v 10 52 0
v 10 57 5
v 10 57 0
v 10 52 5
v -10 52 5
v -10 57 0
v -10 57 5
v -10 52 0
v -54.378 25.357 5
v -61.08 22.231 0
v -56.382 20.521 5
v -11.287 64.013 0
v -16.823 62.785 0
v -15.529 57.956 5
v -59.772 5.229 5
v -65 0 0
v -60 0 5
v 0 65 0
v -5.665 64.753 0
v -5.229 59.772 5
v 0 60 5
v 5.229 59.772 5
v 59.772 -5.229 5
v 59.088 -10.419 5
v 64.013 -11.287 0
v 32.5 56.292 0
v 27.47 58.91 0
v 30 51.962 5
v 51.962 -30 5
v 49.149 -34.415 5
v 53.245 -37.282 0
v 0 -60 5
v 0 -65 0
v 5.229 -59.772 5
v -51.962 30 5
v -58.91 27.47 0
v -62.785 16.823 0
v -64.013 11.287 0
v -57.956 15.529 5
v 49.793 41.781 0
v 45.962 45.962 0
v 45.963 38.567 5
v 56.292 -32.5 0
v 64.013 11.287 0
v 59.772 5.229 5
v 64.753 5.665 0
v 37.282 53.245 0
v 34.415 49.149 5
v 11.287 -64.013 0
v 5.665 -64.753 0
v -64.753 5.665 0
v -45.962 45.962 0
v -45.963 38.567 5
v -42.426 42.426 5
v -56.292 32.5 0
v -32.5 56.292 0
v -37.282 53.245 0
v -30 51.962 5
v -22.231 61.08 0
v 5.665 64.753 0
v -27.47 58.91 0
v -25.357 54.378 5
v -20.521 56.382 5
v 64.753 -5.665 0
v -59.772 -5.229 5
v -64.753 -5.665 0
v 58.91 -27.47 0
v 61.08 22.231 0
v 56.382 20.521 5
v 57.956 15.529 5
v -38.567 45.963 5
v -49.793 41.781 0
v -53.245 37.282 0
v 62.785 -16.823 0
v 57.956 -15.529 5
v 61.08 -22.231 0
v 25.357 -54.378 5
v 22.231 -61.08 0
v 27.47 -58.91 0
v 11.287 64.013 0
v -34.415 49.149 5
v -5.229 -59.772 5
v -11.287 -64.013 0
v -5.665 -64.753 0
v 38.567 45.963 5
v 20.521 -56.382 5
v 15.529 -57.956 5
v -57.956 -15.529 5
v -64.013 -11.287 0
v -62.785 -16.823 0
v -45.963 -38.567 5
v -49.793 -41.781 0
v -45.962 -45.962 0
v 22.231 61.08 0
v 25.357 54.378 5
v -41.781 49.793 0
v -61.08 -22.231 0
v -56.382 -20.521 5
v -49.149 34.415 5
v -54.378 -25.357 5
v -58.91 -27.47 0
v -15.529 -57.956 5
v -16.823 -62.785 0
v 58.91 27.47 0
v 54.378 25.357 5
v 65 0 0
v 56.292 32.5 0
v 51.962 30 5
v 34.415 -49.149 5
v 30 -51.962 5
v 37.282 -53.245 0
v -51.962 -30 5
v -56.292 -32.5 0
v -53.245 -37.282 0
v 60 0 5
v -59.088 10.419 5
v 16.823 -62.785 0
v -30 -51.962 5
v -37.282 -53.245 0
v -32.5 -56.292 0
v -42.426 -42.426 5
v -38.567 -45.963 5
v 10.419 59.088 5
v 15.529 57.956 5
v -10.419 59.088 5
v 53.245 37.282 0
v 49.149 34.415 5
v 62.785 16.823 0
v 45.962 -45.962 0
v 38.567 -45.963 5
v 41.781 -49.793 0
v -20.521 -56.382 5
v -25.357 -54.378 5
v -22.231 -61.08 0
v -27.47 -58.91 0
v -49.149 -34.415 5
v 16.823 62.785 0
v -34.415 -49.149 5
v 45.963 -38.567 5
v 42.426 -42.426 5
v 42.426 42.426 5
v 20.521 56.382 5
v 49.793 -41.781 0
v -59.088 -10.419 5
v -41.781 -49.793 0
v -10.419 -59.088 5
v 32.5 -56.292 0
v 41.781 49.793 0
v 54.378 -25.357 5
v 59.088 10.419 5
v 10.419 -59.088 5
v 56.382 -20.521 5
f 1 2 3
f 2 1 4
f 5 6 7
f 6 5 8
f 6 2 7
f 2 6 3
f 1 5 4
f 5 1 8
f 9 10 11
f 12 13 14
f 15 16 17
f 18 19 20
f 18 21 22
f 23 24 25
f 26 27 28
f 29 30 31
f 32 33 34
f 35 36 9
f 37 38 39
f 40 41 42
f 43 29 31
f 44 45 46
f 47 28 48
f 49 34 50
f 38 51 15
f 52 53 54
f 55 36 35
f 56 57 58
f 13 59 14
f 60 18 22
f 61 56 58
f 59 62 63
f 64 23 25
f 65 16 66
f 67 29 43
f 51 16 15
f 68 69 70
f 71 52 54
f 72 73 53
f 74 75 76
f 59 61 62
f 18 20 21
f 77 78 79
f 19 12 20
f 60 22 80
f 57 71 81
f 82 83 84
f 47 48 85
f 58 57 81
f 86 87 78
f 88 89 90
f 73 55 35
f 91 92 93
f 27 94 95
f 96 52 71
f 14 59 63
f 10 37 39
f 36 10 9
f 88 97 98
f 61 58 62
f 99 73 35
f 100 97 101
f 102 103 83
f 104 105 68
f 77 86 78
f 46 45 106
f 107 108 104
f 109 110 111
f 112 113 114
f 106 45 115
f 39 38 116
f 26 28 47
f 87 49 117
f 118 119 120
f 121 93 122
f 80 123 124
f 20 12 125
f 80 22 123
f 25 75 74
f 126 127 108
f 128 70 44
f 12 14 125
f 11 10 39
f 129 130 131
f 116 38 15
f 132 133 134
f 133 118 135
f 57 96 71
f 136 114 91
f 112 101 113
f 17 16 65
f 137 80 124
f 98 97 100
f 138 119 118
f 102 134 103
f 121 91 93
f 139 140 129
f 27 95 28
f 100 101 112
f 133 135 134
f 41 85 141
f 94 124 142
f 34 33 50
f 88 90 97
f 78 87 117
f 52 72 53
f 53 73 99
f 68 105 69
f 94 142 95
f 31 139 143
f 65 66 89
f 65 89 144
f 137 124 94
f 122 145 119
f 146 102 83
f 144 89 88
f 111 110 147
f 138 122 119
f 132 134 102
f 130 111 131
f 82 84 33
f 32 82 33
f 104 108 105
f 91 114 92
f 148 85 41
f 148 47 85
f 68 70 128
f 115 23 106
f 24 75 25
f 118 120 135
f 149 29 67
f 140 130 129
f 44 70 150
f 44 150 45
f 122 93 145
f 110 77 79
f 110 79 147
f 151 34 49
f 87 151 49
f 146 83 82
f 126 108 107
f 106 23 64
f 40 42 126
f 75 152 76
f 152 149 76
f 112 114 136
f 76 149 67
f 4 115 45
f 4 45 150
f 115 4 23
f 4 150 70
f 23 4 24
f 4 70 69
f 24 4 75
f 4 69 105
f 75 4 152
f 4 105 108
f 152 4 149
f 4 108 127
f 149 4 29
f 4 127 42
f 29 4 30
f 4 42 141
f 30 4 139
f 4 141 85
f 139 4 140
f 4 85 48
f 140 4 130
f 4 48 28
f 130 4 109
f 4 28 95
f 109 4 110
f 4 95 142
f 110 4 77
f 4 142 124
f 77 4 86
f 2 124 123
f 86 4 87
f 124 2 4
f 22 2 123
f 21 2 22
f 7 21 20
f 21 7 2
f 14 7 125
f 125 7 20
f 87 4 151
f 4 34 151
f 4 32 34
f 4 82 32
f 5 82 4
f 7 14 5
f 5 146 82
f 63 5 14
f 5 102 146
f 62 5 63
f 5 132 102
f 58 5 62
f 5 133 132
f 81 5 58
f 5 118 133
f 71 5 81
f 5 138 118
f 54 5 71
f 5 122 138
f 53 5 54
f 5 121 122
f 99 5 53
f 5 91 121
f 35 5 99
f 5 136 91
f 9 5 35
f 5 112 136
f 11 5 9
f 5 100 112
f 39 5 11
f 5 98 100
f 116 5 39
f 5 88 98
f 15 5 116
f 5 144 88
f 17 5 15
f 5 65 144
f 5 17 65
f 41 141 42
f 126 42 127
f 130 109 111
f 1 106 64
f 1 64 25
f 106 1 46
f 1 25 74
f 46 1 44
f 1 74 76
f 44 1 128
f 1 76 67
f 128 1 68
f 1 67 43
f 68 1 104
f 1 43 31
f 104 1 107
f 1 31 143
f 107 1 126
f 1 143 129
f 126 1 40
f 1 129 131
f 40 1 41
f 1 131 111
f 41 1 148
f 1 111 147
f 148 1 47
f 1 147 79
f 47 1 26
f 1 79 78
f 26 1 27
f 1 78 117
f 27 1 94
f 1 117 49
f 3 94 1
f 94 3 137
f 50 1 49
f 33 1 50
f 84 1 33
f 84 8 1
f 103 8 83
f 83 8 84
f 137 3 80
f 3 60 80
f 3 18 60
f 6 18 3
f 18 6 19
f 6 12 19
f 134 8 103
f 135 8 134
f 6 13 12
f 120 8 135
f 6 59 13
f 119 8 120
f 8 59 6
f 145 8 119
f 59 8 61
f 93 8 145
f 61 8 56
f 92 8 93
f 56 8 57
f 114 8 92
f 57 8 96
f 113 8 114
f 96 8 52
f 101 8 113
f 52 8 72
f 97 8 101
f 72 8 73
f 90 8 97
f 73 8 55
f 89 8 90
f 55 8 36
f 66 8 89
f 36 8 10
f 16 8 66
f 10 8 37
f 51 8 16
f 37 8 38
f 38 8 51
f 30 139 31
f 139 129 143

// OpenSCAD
// file: main.scad
/*
 * File: main.scad
 * Copyright (c) 2021 Mihail Korkin <korkin_mv@protonmail.ch>
 * License: MIT
*/

stand_upside_radius = 120/2;
stand_height = 5;

led_length = 75;
led_width = 8;

lamp_thickness = 5;
lamp_height = 200;
lamp_width = led_width * 2.5;
lamp_round_height = 20;
lamp_wire_radius = 5/2;

module kch07pl_lamp() {
    $fn=18;
    t=lamp_thickness;
    x=stand_upside_radius+led_length/2;
    y=lamp_height;
    z=lamp_width;
    rh=lamp_round_height;
    wr=lamp_wire_radius;
    
    difference() {
        linear_extrude(z, center = true) {
            polygon([
                [t, 0],
                [t, y-rh],
                [rh+t, y],
                [x+t, y],
                [x+t, y+t],
                [rh, y+t],
                [0, y-rh+t],
                [0, 0]
            ]);
        }
        
        translate([0,y-wr,0]) rotate([0, 90, 0])
            cylinder(h=x+t, r=wr);
    }
}

module kch07pl_lamp_normal() {
    ur = stand_upside_radius;
    
    translate([0, ur-3, -0.001])
        rotate([90, 0, -90])
            kch07pl_lamp();
}

module kch07pl_stand() {
    $fa=5;
    
    ur = stand_upside_radius;
    h = stand_height;
    
    difference() {
        rotate_extrude() {
            polygon(points = [
                [0, 0],
                [ur+h, 0],
                [ur, h],
                [0, h]
            ]);
        }
        
        kch07pl_lamp_normal();
    }
}

module kch07pl() {
    kch07pl_stand();
    kch07pl_lamp_normal();
}

kch07pl();
// main file
/* 
 * File: stand.scad
 * Copyright (c) 2021 Mihail Korkin <korkin_mv@protonmail.ch>
 * License: MIT
 *
 * File for generate stl file.
*/

use <main.scad>

kch07pl_stand();
